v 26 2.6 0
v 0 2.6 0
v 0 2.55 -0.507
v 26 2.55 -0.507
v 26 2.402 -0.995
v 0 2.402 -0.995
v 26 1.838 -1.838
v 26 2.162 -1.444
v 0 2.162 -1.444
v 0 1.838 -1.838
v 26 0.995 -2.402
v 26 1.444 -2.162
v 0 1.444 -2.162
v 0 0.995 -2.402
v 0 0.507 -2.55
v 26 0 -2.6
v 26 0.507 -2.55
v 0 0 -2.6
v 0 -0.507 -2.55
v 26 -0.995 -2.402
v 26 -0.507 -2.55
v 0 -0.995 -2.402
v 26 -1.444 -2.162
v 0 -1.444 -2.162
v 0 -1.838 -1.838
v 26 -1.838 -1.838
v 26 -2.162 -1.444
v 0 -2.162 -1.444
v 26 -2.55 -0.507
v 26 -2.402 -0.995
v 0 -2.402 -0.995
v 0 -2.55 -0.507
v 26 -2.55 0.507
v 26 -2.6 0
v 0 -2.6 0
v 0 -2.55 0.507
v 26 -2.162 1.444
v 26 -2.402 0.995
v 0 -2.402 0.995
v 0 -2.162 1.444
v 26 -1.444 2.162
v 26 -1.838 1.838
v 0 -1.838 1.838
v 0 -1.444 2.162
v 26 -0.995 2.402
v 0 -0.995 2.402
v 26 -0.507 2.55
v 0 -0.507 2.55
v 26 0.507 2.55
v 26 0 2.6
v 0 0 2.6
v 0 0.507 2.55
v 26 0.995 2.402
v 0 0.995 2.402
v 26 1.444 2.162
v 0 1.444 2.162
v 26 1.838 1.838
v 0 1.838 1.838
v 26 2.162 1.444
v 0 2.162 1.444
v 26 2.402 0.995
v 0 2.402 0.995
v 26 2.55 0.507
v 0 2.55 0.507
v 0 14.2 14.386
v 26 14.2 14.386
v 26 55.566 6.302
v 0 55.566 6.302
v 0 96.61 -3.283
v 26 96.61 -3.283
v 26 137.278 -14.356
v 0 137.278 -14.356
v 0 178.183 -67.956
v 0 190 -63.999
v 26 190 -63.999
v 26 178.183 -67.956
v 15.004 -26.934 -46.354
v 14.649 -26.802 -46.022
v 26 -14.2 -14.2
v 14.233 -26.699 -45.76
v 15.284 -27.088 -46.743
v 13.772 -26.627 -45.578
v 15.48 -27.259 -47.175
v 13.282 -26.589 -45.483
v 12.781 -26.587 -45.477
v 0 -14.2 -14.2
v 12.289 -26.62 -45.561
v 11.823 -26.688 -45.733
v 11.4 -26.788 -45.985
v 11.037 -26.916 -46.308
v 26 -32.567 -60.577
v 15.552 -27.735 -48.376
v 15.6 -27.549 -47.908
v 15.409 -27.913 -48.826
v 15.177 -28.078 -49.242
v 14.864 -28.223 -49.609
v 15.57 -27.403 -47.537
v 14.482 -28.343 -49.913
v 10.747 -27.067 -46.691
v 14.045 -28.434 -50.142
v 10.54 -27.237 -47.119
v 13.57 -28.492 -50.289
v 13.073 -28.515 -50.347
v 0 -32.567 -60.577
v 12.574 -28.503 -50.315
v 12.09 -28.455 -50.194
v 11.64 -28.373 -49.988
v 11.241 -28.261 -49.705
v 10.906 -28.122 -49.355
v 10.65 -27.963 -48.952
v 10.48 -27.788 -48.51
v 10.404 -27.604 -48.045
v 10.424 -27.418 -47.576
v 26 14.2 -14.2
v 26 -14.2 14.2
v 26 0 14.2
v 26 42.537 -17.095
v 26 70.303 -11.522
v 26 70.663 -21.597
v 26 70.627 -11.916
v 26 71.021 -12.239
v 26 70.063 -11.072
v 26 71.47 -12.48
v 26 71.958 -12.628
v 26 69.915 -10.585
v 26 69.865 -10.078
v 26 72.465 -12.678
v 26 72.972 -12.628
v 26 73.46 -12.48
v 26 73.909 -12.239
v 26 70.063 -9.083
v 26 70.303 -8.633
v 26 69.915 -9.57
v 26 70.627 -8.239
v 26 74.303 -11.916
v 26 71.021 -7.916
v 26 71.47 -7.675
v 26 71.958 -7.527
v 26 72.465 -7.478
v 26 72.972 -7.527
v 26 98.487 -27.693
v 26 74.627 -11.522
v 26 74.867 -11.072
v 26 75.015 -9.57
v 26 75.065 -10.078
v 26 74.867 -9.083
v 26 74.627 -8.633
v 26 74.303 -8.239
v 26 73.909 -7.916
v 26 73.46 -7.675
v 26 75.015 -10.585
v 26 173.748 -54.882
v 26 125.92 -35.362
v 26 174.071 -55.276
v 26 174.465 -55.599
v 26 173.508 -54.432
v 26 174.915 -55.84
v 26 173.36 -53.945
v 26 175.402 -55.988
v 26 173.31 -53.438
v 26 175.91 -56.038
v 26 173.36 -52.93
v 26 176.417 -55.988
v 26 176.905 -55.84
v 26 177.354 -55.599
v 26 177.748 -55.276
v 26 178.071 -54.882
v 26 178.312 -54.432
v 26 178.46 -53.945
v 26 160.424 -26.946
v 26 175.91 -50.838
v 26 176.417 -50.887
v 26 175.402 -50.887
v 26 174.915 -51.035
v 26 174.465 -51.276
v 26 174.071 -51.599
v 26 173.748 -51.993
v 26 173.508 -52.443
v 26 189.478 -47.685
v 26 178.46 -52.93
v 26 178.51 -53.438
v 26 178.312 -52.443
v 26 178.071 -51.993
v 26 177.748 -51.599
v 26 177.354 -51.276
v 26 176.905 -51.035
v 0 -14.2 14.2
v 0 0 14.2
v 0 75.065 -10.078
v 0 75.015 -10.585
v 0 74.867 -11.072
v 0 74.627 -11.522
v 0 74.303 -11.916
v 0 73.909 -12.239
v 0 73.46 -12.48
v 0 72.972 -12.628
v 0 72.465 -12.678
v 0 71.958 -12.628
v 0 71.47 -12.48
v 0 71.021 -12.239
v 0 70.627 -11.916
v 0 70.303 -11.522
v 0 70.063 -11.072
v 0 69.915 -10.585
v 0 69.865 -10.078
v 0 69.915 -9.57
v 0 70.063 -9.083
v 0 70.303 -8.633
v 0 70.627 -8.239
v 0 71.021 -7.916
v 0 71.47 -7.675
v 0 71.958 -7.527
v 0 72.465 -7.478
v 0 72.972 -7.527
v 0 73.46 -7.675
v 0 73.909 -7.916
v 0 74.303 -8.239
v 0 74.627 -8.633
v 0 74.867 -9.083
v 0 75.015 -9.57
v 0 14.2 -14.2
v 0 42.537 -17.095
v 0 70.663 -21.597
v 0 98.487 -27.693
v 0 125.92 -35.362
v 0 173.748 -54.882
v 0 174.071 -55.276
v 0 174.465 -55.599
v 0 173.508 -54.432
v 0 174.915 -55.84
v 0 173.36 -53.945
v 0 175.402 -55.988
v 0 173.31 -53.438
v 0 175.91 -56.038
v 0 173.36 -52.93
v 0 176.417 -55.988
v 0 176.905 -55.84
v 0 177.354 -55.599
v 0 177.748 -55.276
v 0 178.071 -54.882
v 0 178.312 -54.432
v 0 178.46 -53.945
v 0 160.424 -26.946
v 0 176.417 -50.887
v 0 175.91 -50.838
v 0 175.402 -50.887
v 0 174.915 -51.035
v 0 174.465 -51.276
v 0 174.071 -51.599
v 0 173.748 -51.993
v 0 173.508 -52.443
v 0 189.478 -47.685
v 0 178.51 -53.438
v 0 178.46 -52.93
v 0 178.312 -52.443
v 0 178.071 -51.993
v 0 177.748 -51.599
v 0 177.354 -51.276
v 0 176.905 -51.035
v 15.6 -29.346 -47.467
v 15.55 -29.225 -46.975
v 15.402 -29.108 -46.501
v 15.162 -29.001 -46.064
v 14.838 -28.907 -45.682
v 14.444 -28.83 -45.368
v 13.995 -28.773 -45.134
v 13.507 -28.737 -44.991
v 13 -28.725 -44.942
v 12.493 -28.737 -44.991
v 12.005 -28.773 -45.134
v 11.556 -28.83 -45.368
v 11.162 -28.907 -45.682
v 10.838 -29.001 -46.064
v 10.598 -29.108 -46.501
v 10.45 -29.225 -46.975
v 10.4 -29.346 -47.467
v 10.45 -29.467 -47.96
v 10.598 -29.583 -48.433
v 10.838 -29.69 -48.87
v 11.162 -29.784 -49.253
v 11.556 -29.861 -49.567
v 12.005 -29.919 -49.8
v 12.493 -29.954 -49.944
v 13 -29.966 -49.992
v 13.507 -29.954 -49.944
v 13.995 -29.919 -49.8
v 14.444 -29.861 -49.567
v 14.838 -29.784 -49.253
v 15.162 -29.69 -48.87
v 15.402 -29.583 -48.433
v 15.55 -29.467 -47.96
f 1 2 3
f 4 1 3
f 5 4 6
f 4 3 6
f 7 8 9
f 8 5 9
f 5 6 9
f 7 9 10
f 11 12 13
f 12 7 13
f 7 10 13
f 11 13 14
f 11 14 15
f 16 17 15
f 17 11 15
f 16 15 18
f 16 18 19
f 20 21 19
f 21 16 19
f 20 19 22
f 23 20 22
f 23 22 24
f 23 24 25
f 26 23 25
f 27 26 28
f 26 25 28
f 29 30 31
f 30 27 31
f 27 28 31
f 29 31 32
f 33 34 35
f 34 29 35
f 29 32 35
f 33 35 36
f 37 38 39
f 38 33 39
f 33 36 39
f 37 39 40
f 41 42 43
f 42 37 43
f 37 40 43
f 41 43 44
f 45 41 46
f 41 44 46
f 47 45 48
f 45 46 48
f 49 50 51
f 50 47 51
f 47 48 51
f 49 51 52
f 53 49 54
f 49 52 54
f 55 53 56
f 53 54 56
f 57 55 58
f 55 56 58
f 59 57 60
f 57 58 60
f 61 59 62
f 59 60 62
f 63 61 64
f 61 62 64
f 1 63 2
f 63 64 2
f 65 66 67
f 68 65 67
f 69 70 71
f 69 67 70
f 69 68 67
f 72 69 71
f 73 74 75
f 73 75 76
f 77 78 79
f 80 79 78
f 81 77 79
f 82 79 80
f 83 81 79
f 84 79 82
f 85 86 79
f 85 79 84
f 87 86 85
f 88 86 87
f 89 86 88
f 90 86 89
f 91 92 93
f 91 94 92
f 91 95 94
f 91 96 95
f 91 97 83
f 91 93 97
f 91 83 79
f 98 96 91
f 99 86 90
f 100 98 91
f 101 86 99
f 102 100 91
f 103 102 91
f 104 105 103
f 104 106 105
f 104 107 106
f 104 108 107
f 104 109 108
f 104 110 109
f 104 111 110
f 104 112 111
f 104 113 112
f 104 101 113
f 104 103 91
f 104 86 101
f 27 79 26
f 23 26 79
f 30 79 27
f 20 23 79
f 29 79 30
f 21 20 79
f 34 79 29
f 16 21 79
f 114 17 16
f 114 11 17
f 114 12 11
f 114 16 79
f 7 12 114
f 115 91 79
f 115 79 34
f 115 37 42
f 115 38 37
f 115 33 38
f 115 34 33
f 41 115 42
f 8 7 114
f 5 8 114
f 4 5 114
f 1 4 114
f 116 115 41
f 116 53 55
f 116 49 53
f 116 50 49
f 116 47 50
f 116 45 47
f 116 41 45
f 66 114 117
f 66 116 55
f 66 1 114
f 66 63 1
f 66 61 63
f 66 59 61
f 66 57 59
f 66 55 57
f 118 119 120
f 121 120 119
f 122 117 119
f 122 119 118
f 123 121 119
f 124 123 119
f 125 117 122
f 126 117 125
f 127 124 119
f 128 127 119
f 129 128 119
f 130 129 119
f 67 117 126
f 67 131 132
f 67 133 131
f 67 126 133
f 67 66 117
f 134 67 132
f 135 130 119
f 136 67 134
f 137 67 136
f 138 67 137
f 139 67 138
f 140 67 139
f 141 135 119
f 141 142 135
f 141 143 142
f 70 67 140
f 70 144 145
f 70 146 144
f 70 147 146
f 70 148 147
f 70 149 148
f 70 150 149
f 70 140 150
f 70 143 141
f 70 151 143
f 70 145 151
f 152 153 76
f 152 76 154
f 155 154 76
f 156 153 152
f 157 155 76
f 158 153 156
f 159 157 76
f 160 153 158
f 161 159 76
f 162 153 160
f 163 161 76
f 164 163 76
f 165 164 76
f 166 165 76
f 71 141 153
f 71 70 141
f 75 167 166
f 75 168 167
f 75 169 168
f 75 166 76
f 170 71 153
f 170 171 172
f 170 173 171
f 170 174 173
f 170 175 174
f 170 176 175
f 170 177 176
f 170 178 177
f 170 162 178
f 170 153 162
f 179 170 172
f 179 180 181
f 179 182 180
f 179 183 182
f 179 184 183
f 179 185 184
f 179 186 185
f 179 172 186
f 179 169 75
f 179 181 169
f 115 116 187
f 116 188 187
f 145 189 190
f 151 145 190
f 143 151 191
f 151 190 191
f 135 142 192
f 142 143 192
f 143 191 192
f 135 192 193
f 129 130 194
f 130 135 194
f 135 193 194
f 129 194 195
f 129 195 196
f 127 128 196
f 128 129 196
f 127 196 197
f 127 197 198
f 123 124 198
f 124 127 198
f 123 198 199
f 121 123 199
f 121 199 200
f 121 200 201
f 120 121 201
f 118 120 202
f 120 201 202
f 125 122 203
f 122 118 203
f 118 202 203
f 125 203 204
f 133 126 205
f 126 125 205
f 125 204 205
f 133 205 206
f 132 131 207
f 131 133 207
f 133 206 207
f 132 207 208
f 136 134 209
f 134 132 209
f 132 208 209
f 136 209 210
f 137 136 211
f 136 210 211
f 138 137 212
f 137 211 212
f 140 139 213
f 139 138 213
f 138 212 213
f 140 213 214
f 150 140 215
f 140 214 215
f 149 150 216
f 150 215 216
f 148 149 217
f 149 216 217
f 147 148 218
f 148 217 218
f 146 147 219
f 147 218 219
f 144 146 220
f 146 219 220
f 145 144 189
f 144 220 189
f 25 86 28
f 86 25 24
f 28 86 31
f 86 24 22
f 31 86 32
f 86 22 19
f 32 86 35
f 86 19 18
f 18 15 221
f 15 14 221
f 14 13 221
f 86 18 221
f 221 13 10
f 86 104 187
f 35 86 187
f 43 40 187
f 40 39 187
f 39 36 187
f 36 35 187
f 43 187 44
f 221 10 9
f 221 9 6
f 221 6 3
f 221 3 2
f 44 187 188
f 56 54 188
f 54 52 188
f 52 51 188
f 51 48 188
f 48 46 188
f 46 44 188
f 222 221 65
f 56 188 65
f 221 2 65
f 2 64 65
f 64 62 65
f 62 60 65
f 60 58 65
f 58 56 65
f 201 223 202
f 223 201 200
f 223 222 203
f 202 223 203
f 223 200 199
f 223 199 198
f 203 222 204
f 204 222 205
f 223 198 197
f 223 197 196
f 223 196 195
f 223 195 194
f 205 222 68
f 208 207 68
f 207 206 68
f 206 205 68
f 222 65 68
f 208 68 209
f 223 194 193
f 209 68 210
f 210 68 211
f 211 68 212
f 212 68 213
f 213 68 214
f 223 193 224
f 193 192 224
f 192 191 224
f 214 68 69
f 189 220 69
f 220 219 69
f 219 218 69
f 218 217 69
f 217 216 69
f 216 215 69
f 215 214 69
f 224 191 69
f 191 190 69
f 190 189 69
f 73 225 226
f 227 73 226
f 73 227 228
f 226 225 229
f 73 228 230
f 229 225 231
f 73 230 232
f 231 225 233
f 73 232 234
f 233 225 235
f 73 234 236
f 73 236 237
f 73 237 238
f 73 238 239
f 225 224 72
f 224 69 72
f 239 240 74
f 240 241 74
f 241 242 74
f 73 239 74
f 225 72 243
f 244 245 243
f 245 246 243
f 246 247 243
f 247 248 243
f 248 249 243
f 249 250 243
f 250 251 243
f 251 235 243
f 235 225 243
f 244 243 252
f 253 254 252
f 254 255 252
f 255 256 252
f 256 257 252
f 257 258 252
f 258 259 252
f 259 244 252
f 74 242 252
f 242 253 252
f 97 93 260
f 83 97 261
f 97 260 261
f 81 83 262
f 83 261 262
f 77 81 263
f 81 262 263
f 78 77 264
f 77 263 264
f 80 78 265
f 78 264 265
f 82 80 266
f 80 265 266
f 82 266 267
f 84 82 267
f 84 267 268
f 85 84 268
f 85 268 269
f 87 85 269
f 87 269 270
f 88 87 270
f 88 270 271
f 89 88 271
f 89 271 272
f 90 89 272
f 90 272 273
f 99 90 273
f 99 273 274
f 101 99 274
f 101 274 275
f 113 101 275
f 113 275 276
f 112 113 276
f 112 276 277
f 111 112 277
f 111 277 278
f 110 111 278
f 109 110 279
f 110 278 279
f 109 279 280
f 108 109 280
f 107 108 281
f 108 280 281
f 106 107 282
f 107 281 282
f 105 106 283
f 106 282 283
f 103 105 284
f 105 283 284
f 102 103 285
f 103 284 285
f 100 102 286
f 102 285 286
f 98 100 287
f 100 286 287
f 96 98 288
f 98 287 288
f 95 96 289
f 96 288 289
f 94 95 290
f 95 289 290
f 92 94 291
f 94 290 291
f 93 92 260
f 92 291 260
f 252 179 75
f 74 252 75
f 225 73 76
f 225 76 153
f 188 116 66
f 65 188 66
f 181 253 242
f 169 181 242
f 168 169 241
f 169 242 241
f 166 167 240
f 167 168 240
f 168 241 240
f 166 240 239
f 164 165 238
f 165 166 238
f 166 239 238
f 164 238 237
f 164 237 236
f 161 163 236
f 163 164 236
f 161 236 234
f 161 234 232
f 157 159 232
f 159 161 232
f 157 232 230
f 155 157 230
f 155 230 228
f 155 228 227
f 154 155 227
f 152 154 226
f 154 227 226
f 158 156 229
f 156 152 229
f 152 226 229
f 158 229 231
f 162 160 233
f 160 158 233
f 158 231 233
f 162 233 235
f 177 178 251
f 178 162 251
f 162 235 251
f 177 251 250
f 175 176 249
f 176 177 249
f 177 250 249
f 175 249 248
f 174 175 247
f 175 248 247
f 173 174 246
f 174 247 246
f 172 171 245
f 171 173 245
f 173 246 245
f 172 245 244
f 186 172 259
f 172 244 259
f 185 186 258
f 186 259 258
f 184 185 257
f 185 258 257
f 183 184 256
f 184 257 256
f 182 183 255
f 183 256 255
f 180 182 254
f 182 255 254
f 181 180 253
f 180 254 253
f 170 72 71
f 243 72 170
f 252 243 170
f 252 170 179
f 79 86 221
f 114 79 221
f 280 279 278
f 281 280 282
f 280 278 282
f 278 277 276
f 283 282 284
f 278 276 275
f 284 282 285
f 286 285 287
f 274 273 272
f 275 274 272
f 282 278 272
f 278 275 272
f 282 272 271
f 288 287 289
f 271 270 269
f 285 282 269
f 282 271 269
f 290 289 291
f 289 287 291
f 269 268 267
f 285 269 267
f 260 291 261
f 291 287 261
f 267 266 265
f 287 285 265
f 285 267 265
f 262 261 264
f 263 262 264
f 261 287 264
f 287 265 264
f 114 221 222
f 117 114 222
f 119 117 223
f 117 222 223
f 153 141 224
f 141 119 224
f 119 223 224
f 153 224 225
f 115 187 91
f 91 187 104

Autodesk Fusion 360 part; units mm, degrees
sketch "Sketch1" plane through (0, 0, 0) normal (1, 0, 0) x (0, 1, 0)
  circle A0 centre (0, 0) radius 2.6
  circle A1 centre (175.9096, -53.4375) radius 2.6
  line L0 (137.2781, -14.356) -> (160.424, -26.9456)
  line L1 (160.424, -26.9456) -> (189.4776, -47.6848)
  line L2 (189.4776, -47.6848) -> (189.9997, -63.9991)
  line L3 (189.9997, -63.9991) -> (178.1831, -67.9555)
  line L4 (178.1831, -67.9555) -> (125.9198, -35.3622)
  circle A2 centre (72.465, -10.0775) radius 2.6
  line L5 (-14.2, 14.2002) -> (-32.5668, -60.5772)
  line L6 (0, 14.2002) -> (14.2, 14.3859)
  line L7 (0, 14.2002) -> (-14.2, 14.2002)
  line L8 (0, -14.2002) -> (14.2, -14.2002)
  line L9 (0, -14.2002) -> (-14.2, -14.2002)
  line L10 (-14.2, -14.2002) -> (-32.5668, -60.5772)
  arc A3 (137.2781, -14.356) -> (14.2, 14.3859) centre (-186.9778, -1124.9865) ccw
  arc A4 (125.9198, -35.3622) -> (14.2, -14.2002) centre (-22.4488, -513.1589) ccw
  dimension "d1" = 5.2
  dimension "d7" = 5.2
  dimension "d37" = 5.2
  dimension "d40" = 77
extrude "Extrude1" add sketch "Sketch1" along normal mid plane 52
sketch "Sketch2" plane through (0, -16.6815, 4.0973) normal (0, -0.9711, 0.2385) x (1, 0, 0)
  line L0 (26, -66.5968) -> (26, 10.4032)
extrude "Extrude2" cut 1 faces at (-26, 27.9887, 2.1627) along direction (1, 0, 0) blind 26
sketch "Sketch3" plane through (0, -16.6815, 4.0973) normal (0, -0.9711, 0.2385) x (1, 0, 0)
  line L0 (0, 10.4032) -> (0, -66.5968)
  line L1 (0, -66.5968) -> (26, -66.5968)
  line L2 (26, -66.5968) -> (26, 10.4032)
  line L3 (26, 10.4032) -> (0, 10.4032)
  circle A0 centre (13, -53.0968) radius 2.6
  dimension "d53" = 5.2
extrude "Extrude3" cut sketch "Sketch3" against normal blind 5 contours A0
